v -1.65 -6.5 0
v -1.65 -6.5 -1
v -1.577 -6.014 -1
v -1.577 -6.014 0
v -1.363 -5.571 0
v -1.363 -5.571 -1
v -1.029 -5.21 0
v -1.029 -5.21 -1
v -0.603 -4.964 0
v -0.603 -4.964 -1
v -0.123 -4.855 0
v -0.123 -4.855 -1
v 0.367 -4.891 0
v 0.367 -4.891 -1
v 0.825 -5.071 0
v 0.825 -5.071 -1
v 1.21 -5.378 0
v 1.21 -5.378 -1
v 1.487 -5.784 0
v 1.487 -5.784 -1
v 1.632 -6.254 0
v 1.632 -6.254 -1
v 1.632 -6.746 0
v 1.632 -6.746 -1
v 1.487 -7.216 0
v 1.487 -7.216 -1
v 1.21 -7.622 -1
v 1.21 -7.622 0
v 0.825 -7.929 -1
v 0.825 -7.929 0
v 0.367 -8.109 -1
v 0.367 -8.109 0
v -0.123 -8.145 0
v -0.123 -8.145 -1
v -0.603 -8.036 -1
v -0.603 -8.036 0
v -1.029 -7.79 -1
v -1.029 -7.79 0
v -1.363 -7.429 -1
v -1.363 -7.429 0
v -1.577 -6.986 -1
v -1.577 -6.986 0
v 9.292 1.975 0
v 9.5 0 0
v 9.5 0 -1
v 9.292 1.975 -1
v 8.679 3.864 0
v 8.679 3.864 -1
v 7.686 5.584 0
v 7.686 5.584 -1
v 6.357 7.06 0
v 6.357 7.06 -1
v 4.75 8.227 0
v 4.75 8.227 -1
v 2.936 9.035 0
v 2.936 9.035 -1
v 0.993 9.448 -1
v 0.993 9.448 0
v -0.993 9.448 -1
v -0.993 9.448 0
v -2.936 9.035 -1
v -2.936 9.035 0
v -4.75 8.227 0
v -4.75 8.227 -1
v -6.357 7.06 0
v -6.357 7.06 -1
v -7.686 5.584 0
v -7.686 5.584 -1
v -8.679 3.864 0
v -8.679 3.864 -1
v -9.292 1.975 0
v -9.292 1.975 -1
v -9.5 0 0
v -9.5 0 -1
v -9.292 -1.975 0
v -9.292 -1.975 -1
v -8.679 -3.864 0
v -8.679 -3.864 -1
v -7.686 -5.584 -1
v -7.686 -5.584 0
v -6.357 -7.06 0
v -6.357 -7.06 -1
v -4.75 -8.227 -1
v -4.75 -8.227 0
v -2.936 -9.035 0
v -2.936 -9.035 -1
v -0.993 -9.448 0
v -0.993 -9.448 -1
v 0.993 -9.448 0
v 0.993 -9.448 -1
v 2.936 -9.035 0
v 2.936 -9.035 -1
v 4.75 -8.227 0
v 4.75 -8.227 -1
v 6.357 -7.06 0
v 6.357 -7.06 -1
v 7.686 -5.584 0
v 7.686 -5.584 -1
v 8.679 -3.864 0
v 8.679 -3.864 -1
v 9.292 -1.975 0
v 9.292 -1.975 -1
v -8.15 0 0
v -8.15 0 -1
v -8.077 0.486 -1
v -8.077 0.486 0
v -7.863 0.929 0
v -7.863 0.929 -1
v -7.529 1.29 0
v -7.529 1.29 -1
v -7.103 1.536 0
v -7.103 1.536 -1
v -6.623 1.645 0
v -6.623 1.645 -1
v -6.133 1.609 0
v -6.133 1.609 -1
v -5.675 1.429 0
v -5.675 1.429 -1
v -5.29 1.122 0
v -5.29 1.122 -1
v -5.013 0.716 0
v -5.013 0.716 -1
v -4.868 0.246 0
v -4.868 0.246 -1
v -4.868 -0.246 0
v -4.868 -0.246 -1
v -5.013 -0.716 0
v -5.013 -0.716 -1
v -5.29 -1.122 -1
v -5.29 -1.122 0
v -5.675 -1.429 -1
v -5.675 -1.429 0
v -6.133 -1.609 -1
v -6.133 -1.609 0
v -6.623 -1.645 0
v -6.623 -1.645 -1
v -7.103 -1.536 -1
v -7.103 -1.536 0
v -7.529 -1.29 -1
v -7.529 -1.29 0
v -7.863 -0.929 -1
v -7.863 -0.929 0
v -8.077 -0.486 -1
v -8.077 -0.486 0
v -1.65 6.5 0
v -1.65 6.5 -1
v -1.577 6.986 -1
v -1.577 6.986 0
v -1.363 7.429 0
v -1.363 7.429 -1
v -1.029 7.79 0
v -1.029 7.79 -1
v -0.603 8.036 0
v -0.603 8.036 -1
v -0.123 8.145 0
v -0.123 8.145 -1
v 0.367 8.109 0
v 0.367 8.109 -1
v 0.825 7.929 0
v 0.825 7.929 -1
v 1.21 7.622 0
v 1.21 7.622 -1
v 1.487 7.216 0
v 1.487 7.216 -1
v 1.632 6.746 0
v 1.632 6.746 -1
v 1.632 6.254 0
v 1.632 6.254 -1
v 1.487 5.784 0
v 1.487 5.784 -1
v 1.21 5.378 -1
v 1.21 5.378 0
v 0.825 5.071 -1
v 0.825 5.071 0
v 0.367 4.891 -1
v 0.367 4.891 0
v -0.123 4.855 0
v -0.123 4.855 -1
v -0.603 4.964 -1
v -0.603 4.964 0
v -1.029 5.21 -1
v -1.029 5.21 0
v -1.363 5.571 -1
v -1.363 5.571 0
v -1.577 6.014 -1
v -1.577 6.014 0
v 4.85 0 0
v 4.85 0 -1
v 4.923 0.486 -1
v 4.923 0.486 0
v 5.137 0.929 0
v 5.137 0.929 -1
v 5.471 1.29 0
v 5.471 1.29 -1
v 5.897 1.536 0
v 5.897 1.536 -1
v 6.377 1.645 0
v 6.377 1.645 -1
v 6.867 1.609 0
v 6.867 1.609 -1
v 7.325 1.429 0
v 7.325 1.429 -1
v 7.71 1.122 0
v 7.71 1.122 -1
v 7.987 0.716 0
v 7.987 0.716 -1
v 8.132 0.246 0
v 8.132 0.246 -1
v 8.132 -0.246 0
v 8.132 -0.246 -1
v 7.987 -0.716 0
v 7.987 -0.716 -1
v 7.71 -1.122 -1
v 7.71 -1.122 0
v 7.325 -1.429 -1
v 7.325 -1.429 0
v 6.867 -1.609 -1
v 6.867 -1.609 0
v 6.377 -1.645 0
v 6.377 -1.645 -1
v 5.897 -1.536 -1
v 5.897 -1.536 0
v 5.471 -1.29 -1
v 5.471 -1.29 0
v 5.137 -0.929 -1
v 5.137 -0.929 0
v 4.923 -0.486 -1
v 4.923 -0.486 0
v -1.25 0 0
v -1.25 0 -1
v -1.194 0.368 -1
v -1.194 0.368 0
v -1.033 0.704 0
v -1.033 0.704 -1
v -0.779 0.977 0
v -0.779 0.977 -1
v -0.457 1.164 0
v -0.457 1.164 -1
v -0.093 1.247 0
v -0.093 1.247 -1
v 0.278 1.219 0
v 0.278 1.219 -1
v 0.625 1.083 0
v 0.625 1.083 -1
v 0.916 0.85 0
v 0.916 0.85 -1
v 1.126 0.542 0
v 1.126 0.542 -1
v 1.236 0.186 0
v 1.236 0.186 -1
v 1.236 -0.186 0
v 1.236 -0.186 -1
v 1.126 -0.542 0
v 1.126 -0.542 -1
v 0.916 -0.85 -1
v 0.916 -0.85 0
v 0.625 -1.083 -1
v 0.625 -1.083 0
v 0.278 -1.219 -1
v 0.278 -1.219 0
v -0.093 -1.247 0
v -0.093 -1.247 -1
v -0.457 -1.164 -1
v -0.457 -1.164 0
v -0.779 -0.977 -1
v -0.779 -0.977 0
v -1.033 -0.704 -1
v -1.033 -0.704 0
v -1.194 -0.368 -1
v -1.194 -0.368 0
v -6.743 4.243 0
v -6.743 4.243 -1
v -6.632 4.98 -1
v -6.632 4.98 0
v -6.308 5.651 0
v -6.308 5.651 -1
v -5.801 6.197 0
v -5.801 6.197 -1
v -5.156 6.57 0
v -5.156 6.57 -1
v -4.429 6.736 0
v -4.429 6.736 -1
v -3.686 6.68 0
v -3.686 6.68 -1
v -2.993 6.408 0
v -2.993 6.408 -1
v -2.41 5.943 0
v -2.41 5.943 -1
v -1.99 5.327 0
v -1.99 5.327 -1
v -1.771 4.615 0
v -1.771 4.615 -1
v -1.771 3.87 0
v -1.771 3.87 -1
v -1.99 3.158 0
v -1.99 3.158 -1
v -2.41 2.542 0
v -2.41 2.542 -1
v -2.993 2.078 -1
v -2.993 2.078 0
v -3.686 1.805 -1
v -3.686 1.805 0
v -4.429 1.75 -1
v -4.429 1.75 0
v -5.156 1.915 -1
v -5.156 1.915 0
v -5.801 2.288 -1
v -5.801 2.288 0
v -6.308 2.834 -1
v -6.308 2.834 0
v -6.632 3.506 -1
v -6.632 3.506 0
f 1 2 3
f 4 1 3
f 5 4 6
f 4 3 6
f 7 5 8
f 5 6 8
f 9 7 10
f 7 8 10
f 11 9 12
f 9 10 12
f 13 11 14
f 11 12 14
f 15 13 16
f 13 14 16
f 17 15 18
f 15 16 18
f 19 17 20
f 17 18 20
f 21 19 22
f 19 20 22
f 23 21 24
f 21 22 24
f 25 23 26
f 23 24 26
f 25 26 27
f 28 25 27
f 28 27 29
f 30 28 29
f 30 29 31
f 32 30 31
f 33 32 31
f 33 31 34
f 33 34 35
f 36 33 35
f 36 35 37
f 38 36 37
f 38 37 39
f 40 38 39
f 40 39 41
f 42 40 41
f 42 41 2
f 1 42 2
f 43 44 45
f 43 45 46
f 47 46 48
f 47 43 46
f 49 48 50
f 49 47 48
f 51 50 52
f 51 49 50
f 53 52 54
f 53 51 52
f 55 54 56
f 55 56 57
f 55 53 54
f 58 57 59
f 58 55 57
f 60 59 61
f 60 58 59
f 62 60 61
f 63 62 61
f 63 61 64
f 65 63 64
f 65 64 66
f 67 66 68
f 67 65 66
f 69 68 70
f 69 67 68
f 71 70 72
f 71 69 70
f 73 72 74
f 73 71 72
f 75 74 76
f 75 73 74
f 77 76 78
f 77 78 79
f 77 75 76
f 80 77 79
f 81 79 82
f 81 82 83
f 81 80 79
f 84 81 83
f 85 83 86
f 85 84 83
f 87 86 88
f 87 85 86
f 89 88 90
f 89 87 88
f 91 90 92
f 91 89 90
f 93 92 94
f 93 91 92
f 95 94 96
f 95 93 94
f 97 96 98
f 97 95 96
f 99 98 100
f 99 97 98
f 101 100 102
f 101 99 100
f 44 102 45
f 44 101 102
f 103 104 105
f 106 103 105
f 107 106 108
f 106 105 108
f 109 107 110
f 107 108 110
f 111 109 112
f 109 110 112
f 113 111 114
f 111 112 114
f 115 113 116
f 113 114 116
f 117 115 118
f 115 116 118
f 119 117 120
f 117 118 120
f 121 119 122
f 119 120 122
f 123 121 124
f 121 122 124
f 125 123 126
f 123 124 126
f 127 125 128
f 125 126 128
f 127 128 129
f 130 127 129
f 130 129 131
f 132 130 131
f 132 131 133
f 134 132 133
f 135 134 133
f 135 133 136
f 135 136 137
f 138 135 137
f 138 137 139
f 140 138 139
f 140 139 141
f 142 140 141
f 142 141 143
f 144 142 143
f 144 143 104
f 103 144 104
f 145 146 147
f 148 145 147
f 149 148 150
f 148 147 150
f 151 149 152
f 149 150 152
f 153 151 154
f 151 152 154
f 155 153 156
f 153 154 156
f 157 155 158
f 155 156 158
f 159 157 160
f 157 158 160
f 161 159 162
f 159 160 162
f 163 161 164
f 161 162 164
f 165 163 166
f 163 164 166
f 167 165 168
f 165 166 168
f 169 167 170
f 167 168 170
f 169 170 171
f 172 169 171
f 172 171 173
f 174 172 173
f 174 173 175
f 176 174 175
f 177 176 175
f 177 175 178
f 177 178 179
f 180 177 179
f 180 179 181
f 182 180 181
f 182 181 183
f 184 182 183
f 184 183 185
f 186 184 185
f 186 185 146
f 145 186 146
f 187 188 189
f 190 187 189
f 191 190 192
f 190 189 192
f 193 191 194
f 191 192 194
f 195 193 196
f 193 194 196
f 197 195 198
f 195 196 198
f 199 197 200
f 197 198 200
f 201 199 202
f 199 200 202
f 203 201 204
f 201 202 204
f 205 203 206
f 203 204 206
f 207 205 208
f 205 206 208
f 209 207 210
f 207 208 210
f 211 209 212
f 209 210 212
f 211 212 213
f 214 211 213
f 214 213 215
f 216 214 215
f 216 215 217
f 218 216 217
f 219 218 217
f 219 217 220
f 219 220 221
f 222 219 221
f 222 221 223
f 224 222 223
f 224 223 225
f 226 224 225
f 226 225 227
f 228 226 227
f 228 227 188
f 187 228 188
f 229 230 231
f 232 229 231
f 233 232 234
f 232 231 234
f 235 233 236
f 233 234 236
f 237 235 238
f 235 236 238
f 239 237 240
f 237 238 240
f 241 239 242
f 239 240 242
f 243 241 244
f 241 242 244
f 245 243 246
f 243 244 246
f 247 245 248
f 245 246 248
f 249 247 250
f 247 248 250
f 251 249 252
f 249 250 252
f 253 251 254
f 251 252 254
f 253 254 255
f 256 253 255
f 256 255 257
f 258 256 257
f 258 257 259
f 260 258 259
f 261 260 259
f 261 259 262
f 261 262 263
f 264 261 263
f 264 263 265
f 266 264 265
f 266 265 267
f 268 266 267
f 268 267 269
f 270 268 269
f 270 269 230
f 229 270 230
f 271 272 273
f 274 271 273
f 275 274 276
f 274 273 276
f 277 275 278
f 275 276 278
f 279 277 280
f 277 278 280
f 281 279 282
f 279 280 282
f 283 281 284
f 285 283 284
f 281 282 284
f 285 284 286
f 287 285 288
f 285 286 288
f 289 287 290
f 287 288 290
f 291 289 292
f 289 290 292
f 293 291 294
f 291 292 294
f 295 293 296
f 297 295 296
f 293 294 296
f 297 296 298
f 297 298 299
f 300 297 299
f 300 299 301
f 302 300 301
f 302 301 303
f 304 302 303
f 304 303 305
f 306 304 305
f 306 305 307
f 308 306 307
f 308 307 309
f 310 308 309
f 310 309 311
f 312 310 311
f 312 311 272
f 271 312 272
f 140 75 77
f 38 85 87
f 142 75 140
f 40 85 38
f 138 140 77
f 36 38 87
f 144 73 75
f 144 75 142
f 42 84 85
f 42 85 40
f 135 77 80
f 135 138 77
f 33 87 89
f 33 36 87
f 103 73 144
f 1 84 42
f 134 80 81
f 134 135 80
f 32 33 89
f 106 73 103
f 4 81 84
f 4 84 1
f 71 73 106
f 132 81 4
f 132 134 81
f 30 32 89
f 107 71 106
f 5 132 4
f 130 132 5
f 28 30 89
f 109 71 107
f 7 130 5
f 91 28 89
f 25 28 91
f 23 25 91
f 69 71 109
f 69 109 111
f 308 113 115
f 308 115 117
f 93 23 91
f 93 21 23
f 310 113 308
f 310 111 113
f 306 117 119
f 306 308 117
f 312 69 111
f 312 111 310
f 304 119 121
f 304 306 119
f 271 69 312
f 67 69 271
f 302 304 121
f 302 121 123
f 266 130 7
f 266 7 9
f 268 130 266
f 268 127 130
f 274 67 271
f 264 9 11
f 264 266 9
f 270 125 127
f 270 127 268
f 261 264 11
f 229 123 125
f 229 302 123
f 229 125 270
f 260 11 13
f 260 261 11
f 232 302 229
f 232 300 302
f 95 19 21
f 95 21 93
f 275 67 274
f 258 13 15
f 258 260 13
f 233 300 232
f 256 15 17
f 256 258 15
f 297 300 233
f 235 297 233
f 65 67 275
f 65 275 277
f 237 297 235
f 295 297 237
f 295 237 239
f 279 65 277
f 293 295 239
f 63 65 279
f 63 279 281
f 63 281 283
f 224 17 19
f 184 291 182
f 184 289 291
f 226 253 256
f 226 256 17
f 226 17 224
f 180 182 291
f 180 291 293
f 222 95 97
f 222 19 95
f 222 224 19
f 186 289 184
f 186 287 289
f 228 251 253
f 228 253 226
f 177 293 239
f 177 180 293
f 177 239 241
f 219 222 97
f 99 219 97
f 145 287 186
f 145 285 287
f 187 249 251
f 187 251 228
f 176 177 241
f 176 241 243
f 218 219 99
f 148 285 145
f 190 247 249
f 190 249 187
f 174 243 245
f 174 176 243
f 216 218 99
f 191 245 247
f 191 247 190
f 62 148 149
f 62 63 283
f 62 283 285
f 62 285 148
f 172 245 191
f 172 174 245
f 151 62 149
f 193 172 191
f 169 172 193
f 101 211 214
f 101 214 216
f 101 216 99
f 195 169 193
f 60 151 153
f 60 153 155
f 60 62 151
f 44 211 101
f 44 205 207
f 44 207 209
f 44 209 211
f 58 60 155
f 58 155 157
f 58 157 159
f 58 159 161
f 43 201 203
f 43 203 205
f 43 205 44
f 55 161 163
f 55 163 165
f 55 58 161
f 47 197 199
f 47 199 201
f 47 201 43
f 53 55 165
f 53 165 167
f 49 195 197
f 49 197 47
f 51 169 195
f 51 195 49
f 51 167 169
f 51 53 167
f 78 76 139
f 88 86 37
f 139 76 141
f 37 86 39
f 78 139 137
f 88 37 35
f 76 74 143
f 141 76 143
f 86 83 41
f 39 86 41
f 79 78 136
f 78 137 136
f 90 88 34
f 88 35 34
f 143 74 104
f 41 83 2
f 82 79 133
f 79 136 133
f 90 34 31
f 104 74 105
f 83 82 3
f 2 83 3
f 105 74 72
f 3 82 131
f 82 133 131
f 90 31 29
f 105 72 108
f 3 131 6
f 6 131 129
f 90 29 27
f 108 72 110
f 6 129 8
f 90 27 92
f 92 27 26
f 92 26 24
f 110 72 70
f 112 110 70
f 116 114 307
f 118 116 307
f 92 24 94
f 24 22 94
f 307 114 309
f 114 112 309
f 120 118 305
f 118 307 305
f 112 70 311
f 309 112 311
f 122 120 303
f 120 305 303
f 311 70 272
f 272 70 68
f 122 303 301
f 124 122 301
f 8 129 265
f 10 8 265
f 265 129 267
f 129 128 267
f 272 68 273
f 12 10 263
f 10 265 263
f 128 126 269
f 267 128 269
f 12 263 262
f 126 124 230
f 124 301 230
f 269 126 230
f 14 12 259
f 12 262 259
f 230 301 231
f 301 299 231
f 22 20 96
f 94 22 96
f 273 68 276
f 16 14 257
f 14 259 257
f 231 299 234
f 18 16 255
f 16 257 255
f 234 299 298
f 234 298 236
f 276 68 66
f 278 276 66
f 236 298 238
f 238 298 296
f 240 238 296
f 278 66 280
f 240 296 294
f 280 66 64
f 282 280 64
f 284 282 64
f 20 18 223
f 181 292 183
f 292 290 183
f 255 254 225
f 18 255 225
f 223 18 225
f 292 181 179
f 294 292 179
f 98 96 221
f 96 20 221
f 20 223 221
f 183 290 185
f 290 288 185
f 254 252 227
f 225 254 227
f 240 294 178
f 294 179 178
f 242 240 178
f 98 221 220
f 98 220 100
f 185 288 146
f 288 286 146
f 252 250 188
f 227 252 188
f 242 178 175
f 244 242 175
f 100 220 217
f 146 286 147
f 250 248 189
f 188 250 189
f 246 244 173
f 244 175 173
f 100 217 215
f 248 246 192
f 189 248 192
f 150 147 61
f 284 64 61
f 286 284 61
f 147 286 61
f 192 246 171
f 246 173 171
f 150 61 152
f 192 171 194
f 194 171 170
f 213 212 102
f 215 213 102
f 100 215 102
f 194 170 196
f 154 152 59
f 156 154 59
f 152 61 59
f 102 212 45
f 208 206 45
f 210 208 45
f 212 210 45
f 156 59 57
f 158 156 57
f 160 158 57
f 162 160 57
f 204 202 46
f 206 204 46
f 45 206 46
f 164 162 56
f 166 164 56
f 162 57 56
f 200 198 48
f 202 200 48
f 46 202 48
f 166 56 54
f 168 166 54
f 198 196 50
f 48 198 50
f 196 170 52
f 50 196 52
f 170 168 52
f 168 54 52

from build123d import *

# Parameters (mm, degrees)
F0_R     = 9.5
F1_DEPTH = 1
F2_D     = 3.3
F3_D     = 5
F4_D     = 2.5


with BuildPart() as f1:
    # F0 (on Top) → F1 (new body)
    with BuildSketch(Plane.XY):
        Circle(F0_R)
    extrude(amount=-F1_DEPTH)

    # F2 (through all)
    with Locations(Plane.XY):
        with Locations((0, 6.5), (-6.5, 0), (0, -6.5), (6.5, 0)):
            Hole(F2_D / 2)

    # F3 (through all)
    with Locations(Plane.XY):
        with Locations((-4.2426406871, 4.2426406871)):
            Hole(F3_D / 2)

    # F4 (through all)
    with Locations(Plane.XY):
        with Locations((0, 0)):
            Hole(F4_D / 2)


solid = f1.part
